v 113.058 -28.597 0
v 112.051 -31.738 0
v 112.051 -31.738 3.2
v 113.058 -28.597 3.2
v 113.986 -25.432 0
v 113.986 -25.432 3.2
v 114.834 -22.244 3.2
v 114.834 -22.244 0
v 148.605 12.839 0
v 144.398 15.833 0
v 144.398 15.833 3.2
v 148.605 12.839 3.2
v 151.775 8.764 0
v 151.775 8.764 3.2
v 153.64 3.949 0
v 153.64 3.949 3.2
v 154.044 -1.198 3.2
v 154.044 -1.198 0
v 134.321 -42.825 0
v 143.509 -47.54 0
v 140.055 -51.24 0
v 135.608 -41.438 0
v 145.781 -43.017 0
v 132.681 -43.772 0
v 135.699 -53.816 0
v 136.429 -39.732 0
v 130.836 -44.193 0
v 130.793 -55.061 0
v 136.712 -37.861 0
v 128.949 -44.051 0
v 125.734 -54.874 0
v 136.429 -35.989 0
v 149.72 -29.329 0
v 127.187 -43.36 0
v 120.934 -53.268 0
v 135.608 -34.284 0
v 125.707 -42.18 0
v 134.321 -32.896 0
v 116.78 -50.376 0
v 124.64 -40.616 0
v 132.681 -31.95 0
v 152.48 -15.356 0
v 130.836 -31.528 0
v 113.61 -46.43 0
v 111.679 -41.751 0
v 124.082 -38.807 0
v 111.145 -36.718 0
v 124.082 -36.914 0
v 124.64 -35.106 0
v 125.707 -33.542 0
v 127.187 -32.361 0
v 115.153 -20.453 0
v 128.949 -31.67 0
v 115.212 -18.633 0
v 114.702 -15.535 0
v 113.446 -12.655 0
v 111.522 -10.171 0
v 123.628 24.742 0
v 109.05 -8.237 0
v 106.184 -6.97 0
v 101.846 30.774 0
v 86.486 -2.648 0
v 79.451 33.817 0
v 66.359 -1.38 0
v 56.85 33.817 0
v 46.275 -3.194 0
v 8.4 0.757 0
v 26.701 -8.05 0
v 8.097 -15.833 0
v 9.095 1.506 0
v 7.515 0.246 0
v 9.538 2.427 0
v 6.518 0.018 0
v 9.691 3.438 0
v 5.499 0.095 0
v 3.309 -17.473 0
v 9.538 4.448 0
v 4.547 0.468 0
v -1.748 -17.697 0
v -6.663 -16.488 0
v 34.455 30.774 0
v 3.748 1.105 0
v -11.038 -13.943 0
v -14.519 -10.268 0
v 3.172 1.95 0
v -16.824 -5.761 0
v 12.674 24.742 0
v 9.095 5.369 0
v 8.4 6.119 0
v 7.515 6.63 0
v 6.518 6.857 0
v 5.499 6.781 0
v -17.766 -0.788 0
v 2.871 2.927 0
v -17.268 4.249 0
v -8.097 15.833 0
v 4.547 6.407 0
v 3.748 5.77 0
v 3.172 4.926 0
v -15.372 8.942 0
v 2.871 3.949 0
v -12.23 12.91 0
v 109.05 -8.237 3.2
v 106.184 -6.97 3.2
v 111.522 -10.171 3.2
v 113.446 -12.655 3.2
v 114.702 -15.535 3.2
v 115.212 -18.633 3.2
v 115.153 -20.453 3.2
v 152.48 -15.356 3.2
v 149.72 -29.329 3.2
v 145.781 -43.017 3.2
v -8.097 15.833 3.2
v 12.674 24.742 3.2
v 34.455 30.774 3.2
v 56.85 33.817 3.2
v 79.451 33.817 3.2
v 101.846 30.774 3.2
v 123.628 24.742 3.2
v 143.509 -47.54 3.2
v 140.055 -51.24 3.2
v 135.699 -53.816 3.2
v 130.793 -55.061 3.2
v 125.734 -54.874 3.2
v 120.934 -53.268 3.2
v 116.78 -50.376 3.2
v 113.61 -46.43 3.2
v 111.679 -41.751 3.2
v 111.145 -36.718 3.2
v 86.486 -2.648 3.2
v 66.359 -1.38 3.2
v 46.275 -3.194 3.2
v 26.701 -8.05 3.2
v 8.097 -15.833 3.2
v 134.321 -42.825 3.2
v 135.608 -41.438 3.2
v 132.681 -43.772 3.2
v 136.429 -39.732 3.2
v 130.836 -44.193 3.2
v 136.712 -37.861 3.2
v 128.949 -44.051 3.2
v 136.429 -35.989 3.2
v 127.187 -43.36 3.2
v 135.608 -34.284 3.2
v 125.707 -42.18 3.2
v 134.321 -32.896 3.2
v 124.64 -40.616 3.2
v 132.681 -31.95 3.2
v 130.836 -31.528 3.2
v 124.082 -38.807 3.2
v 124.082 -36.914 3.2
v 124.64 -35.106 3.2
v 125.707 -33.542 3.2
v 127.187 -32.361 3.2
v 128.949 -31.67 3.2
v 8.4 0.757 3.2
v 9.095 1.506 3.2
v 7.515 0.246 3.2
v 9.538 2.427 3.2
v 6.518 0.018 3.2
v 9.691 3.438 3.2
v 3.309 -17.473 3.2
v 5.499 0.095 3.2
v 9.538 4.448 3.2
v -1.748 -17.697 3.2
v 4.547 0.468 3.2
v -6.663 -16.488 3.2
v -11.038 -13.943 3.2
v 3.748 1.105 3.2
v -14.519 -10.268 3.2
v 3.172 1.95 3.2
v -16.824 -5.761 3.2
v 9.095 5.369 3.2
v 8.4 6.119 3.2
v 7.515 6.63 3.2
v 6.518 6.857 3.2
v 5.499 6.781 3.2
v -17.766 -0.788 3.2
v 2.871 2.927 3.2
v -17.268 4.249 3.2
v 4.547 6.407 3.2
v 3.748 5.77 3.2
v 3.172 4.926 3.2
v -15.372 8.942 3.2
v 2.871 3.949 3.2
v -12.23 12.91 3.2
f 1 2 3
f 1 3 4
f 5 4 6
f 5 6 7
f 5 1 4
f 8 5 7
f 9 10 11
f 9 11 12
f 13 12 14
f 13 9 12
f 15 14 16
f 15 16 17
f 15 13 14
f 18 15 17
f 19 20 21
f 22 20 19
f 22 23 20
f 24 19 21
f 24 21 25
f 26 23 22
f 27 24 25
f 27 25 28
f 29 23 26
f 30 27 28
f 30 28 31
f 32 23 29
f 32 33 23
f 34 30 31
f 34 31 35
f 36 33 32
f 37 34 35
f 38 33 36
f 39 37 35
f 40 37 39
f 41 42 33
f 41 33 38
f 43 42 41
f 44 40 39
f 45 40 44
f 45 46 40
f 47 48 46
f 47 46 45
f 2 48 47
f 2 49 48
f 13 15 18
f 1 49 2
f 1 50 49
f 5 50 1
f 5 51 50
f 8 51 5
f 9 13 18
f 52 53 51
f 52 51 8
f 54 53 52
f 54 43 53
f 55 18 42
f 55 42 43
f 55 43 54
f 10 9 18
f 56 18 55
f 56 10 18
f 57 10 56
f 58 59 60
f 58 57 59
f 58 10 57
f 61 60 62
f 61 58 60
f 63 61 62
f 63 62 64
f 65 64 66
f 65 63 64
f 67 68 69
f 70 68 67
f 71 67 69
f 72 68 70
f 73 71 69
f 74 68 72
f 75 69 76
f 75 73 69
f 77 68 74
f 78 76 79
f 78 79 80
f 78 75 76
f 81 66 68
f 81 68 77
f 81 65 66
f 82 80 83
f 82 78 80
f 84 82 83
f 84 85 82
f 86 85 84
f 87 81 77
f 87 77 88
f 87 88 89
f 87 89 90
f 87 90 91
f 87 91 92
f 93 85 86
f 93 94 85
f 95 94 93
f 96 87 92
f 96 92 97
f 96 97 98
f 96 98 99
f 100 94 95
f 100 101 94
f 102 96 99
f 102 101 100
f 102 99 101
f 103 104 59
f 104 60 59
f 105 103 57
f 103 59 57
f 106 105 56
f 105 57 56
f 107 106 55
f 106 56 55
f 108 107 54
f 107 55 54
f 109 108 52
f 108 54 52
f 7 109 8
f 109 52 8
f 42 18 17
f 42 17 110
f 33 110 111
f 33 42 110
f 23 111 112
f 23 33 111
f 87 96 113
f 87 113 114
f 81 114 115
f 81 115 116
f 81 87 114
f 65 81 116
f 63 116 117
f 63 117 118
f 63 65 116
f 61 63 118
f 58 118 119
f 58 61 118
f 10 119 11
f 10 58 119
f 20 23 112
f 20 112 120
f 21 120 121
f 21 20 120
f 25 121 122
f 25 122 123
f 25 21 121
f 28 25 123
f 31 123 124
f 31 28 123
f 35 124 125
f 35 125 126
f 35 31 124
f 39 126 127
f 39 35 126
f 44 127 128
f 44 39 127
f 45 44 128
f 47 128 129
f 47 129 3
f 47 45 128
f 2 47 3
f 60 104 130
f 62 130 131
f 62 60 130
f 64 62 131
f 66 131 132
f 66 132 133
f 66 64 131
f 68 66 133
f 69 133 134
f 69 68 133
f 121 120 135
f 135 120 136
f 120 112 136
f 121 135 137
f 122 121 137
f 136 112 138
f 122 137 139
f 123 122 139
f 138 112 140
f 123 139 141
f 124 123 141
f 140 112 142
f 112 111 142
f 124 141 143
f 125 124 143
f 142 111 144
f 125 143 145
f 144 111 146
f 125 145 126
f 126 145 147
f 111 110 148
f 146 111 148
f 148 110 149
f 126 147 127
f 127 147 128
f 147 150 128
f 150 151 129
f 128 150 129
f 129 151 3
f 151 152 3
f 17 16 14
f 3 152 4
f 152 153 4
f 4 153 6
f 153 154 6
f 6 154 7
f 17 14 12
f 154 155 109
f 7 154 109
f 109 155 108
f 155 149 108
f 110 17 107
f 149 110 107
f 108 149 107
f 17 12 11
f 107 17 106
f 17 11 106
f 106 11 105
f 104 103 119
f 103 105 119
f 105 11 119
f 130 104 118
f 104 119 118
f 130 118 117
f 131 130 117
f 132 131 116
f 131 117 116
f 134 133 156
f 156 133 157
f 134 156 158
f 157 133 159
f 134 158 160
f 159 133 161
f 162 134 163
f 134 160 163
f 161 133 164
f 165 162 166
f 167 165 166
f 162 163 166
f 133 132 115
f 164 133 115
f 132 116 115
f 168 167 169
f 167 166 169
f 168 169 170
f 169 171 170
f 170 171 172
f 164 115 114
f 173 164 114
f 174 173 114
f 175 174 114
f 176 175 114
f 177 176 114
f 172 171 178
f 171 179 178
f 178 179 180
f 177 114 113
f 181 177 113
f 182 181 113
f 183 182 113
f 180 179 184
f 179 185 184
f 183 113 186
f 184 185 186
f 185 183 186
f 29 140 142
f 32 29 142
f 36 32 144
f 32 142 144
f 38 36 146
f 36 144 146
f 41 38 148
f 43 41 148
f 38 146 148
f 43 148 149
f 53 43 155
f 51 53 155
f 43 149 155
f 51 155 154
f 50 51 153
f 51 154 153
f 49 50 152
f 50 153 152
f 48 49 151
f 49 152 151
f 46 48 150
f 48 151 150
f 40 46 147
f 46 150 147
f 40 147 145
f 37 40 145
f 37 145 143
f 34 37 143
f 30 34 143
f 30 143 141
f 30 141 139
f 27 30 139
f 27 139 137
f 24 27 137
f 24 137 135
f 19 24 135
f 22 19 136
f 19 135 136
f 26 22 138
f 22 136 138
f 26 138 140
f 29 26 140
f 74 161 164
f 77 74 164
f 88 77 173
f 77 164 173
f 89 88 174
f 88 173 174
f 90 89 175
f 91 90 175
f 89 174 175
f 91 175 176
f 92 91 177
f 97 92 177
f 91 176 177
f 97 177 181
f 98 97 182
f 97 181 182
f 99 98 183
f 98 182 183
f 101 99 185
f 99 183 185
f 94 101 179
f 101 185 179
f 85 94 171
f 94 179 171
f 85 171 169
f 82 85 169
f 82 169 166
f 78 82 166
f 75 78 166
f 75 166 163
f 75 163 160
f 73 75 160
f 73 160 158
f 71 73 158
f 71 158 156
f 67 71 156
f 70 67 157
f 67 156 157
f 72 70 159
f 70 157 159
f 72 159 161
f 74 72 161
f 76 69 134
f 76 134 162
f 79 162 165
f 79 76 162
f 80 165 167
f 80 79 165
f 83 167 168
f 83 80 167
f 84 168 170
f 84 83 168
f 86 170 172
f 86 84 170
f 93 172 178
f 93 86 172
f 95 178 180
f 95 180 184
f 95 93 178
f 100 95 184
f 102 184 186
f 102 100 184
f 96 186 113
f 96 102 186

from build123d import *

# Parameters (mm, degrees)
BOSS_EXTRUDE1_DEPTH = 3.2004
SKETCH2_R           = 3.429
CUT_EXTRUDE1_DEPTH  = 3.2004
BOSS_EXTRUDE2_START = -3.2004
BOSS_EXTRUDE2_DEPTH = 3.2004
SKETCH4_R           = 6.35
CUT_EXTRUDE2_DEPTH  = 3.2004
FILLET1_R           = 12.7


with BuildPart() as part:
    # Sketch1 → Boss-Extrude1 (new body)
    with BuildSketch(Plane.XY):
        with BuildLine():
            ThreePointArc((-8.097097761, 15.832735205), (68.150612211, 34.198640293), (144.398322183, 15.832735205))
            ThreePointArc((144.398322183, 15.832735205), (152.133959628, -8.097097761), (128.204126662, -15.832735205))
            ThreePointArc((128.204126662, -15.832735205), (68.150612211, -1.367551307), (8.097097761, -15.832735205))
            ThreePointArc((8.097097761, -15.832735205), (-15.832735205, -8.097097761), (-8.097097761, 15.832735205))
        make_face()
    extrude(amount=BOSS_EXTRUDE1_DEPTH)

    # Sketch2 → Cut-Extrude1 (cut)
    with BuildSketch(Plane.XY.offset(3.2004)):
        with Locations((6.261836343, 3.437760818)):
            Circle(SKETCH2_R)
    extrude(amount=-CUT_EXTRUDE1_DEPTH, mode=Mode.SUBTRACT)

    # Sketch3 → Boss-Extrude2 (add)
    with BuildSketch(Plane.XY.offset(3.2004).offset(BOSS_EXTRUDE2_START)):
        with BuildLine():
            ThreePointArc((118.558560015, 1.198480685), (137.499705108, 17.742664408), (154.04388883, -1.198480685))
            ThreePointArc((154.04388883, -1.198480685), (151.248704167, -22.371604894), (145.781416871, -43.0167742))
            ThreePointArc((145.781416871, -43.0167742), (123.276823543, -54.242649292), (112.05094845, -31.738055964))
            ThreePointArc((112.05094845, -31.738055964), (116.357042584, -15.477699112), (118.558560015, 1.198480685))
        make_face()
    extrude(amount=BOSS_EXTRUDE2_DEPTH)

    # Sketch4 → Cut-Extrude2 (cut)
    with BuildSketch(Plane.XY.offset(3.2004)):
        with Locations((130.361522506, -37.860704571)):
            Circle(SKETCH4_R)
    extrude(amount=-CUT_EXTRUDE2_DEPTH, mode=Mode.SUBTRACT)

    # Fillet1
    fillet1_edges = [part.edges().sort_by_distance(p)[0] for p in [
        (117.190242121, -10.823434725, 1.6002),
    ]]
    fillet(fillet1_edges, radius=FILLET1_R)


solid = part.part
